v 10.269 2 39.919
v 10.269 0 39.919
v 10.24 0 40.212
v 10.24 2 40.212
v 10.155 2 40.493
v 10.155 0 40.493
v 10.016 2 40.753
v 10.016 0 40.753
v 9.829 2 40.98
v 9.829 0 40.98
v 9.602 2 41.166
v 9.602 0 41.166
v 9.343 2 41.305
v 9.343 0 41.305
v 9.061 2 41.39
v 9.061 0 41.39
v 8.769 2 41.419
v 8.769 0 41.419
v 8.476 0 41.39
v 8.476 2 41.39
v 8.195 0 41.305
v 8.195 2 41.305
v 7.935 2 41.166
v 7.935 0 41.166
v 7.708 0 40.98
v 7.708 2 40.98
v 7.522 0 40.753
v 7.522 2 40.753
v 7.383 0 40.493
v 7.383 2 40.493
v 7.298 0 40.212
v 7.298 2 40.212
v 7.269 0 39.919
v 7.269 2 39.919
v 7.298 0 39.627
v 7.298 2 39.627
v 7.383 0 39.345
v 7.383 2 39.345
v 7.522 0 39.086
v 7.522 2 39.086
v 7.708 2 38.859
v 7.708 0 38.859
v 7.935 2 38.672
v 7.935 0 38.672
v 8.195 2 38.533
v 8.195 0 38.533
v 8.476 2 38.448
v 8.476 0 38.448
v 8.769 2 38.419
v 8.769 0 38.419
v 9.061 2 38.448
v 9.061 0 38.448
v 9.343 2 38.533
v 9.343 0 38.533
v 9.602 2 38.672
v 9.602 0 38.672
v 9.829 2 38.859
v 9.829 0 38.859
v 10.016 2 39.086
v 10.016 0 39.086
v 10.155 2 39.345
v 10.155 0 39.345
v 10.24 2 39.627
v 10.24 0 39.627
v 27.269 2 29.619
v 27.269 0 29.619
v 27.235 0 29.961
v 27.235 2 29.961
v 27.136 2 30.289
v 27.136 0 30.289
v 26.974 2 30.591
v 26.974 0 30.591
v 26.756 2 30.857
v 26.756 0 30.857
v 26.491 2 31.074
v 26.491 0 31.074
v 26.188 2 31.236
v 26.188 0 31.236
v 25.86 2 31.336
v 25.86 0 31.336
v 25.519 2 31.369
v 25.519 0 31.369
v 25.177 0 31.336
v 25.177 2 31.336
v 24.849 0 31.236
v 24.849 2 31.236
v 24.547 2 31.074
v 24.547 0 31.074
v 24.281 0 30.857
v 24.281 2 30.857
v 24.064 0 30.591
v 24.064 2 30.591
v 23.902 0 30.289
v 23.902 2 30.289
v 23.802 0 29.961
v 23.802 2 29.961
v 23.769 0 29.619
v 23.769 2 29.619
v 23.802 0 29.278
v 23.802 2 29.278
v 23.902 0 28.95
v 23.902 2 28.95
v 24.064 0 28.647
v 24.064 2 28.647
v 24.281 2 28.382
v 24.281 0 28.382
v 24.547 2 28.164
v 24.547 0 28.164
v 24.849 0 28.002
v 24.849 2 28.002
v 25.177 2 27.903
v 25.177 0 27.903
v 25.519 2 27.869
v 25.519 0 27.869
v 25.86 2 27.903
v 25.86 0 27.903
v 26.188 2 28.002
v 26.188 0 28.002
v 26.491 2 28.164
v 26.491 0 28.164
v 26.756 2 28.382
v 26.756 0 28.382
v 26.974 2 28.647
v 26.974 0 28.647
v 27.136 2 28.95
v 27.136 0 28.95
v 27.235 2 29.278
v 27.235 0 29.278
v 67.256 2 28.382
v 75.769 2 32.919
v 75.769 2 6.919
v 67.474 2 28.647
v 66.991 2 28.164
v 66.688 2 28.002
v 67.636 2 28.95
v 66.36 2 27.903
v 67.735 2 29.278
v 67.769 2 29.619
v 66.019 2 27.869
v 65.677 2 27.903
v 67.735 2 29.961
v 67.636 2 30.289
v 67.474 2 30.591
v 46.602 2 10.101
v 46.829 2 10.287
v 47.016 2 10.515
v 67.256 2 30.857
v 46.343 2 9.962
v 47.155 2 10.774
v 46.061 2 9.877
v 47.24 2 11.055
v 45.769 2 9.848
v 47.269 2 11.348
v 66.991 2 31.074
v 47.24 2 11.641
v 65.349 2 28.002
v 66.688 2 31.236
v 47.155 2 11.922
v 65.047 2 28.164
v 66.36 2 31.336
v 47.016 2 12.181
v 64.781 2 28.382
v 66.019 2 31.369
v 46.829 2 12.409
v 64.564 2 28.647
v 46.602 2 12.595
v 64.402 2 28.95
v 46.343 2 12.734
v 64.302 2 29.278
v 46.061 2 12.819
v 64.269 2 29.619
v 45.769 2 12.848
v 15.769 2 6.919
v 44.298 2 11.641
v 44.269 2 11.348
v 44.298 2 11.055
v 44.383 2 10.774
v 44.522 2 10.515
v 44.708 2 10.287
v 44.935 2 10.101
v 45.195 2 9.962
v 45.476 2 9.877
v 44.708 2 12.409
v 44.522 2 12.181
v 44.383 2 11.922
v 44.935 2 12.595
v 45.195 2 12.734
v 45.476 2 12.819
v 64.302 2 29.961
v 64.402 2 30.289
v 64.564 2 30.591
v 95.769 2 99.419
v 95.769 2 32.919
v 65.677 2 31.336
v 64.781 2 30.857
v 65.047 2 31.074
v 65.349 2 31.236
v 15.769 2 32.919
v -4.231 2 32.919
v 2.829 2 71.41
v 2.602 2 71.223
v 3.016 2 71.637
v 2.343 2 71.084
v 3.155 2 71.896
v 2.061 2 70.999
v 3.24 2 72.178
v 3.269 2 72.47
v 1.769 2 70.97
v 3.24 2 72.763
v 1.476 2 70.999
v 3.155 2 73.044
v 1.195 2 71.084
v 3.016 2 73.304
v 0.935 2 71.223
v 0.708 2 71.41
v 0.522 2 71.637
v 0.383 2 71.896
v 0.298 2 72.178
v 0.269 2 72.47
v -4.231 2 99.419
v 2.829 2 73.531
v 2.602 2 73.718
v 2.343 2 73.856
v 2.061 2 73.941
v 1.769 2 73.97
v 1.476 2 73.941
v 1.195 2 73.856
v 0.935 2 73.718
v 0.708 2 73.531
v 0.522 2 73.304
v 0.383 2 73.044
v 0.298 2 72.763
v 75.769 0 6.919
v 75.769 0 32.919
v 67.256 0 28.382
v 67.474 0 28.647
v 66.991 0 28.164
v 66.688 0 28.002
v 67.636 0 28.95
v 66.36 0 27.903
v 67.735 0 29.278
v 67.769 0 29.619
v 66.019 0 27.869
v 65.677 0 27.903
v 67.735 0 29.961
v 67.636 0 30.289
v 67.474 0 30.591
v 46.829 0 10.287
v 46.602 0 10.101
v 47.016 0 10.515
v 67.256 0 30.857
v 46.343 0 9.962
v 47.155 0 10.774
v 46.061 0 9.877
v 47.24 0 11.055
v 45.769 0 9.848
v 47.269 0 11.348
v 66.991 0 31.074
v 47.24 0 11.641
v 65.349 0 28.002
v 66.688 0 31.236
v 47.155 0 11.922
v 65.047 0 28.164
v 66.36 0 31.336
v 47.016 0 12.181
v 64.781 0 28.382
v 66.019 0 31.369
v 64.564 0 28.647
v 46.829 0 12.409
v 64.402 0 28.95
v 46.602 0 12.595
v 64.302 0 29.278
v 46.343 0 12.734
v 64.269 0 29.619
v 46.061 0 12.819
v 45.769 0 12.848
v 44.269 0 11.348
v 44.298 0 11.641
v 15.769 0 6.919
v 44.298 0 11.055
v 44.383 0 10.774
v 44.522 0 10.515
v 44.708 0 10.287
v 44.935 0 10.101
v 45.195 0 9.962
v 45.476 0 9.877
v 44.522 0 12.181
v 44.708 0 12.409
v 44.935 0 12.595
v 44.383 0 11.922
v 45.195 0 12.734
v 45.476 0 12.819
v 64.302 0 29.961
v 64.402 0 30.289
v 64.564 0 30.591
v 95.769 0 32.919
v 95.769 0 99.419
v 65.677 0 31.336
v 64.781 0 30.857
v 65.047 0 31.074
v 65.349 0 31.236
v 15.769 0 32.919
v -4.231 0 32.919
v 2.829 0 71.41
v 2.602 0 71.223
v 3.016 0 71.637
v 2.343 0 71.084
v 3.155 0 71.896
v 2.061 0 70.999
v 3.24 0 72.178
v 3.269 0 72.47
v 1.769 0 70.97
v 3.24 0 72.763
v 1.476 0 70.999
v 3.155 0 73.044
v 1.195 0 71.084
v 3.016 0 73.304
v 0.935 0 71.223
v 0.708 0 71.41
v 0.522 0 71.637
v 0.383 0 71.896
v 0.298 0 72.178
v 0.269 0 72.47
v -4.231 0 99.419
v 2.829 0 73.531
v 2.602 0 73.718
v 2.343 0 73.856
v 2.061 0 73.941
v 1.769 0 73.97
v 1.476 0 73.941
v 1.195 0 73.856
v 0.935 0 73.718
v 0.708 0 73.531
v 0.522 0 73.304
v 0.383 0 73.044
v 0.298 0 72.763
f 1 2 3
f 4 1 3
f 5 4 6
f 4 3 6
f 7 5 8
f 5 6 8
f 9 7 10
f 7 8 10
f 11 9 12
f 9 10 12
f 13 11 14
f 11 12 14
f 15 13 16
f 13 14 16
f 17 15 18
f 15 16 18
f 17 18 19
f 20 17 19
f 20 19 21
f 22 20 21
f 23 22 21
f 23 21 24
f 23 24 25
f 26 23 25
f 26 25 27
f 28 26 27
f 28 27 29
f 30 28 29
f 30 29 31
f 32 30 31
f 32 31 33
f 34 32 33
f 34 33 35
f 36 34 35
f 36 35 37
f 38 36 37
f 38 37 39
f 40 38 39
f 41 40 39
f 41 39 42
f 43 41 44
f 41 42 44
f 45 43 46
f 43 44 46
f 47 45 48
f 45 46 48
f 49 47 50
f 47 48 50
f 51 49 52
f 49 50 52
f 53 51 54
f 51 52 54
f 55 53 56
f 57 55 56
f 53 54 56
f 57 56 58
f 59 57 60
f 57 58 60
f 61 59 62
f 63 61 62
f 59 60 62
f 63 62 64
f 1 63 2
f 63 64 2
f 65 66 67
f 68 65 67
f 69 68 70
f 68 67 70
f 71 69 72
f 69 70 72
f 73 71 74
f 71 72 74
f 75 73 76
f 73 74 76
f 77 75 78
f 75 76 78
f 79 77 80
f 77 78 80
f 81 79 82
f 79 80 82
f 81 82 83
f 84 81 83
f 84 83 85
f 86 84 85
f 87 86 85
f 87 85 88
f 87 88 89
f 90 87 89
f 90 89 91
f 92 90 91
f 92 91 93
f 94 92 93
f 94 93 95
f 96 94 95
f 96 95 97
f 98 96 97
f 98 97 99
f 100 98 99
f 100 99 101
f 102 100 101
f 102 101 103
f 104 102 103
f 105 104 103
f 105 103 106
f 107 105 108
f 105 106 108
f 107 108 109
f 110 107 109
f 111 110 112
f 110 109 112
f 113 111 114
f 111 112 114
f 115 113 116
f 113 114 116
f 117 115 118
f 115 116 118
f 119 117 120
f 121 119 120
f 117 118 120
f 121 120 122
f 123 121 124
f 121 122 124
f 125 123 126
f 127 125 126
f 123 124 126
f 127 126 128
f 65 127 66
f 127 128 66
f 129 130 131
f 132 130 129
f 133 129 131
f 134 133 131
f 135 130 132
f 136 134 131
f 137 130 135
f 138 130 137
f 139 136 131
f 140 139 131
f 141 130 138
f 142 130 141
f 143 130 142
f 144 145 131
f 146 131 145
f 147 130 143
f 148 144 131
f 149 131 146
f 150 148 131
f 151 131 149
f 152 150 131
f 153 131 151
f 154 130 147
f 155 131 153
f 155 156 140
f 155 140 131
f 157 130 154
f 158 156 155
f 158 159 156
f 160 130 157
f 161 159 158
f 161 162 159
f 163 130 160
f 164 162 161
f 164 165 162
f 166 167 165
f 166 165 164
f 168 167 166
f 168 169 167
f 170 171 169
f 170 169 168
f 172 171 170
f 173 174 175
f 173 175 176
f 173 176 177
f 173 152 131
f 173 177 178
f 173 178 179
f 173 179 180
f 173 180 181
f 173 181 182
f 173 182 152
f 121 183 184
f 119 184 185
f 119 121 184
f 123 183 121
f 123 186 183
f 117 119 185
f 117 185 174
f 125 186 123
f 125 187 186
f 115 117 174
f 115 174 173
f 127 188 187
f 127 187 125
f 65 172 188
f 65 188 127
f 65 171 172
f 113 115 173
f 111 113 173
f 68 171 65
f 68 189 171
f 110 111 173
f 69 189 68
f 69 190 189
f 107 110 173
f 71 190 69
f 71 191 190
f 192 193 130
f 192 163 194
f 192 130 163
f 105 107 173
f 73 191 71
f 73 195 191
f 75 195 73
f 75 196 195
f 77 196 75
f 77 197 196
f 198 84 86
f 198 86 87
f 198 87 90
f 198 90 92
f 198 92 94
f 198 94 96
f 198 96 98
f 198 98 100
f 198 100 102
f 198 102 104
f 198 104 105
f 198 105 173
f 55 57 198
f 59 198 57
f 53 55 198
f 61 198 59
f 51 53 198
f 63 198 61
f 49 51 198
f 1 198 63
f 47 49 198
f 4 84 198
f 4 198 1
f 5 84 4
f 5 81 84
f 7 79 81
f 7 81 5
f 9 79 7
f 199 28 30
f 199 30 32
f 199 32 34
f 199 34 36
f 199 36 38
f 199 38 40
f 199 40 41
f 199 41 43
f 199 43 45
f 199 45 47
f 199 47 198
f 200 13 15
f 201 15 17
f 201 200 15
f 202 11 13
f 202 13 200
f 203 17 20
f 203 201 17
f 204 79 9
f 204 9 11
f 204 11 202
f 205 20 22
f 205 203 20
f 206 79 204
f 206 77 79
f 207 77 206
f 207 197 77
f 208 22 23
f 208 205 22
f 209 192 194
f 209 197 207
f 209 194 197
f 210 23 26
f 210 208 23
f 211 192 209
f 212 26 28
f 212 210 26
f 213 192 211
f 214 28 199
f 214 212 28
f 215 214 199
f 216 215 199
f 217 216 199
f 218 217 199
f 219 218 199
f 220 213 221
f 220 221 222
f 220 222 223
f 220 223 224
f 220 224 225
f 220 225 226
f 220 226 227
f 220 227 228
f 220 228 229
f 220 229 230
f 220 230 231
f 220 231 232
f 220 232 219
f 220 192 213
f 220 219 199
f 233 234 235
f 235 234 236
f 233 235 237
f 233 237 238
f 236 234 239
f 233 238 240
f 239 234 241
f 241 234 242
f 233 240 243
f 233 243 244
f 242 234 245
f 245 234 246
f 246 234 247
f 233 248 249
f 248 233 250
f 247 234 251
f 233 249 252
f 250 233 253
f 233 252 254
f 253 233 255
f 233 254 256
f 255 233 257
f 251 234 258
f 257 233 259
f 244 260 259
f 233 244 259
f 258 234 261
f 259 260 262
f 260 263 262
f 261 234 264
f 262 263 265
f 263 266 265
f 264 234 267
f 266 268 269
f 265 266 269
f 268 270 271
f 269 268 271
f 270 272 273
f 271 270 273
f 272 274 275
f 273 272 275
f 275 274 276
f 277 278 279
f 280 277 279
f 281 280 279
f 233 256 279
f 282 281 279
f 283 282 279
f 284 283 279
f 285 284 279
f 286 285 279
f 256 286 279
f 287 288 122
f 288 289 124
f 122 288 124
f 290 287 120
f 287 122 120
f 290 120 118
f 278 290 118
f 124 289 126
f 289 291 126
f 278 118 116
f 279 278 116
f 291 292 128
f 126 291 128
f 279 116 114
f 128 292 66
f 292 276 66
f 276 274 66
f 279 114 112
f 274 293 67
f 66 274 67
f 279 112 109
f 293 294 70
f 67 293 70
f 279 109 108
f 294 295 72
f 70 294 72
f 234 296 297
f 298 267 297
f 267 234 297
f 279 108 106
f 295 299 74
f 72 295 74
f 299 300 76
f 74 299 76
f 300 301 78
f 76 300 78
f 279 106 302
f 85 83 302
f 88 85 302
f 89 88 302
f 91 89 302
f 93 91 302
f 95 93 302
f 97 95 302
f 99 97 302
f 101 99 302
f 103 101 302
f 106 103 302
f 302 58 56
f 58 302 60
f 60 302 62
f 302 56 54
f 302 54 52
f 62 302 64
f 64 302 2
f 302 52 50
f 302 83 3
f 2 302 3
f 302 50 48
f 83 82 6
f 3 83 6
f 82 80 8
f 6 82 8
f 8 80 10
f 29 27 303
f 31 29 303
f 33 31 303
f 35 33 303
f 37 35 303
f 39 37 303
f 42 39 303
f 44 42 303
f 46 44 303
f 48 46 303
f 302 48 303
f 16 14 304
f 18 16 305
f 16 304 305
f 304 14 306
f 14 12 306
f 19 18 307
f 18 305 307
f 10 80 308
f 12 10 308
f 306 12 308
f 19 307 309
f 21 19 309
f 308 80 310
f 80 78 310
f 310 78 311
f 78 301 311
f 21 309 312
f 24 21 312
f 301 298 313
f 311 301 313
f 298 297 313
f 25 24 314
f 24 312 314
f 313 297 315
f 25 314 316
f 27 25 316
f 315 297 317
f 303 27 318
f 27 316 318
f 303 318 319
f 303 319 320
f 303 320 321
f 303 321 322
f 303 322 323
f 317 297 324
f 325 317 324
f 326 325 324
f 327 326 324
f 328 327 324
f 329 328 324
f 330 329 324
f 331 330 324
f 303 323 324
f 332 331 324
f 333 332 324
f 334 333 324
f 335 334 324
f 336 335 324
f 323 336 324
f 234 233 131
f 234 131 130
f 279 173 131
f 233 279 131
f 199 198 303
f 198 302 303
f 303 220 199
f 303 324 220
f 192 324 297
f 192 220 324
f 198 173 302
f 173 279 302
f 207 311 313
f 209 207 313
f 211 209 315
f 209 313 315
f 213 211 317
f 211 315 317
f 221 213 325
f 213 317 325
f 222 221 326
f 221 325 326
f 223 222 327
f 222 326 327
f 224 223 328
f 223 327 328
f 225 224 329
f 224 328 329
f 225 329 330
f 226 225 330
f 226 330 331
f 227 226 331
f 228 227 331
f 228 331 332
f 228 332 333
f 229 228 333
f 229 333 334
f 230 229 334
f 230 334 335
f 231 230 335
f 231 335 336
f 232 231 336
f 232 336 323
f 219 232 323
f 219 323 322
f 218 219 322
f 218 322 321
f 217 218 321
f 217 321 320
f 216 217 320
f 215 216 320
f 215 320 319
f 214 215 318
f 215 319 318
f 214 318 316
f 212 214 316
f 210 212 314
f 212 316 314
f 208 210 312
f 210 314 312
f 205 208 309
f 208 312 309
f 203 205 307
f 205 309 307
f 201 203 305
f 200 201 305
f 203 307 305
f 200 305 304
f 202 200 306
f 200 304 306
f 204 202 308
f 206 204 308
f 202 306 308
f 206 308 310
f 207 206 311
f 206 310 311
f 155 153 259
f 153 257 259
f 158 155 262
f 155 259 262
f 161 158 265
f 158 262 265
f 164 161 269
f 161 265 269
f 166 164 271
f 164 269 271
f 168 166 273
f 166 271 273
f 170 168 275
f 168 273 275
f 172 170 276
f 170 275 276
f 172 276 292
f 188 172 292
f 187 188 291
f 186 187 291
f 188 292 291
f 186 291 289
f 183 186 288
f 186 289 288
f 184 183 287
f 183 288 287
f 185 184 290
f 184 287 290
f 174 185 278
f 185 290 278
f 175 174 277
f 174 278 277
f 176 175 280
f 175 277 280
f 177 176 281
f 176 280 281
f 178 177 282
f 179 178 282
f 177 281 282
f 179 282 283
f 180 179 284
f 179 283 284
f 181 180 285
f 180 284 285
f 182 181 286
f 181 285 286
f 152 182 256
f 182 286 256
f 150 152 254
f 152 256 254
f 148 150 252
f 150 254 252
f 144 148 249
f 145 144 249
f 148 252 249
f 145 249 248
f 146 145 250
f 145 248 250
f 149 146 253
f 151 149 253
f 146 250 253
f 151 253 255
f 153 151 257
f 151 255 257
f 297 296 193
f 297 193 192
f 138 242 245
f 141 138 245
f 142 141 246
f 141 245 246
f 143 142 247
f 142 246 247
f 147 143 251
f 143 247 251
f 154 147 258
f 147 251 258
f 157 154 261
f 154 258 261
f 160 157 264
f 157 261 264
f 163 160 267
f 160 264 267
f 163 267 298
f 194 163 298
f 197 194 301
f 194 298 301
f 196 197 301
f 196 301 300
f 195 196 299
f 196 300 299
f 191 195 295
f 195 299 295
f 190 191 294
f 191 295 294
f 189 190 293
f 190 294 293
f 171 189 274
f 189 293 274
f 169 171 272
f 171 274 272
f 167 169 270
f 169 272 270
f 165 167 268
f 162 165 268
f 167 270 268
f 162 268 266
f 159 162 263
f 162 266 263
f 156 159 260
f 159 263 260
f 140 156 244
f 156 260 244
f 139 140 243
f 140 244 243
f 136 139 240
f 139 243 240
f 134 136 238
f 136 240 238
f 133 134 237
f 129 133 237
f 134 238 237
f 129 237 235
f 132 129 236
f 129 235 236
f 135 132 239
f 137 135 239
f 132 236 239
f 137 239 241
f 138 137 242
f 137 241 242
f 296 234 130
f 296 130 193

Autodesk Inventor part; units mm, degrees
ref_plane "YZ Plane" through (0, 0, 0) normal (1, 0, 0) x (0, 1, 0)
ref_plane "XZ Plane" through (0, 0, 0) normal (0, 1, 0) x (-1, 0, 0)
ref_plane "XY Plane" through (0, 0, 0) normal (0, 0, 1) x (1, 0, 0)
sketch "Sketch1" plane through (0, 0, 0) normal (0, 1, 0) x (-1, 0, 0)
  line L0 (-95.7688, 101.9192) -> (4.2312, 101.9192)
  line L1 (4.2312, 101.9192) -> (4.2312, 1.9192)
  line L2 (4.2312, 1.9192) -> (-95.7688, 1.9192)
  line L3 (-95.7688, 1.9192) -> (-95.7688, 101.9192)
  line L4 (-95.7688, 1.9192) -> (4.2312, 1.9192)
  line L5 (4.2312, 1.9192) -> (4.2312, 6.9192)
  line L6 (4.2312, 6.9192) -> (-95.7688, 6.9192)
  line L7 (-95.7688, 6.9192) -> (-95.7688, 1.9192)
  line L8 (4.2312, 1.9192) -> (-15.7688, 1.9192)
  line L9 (-15.7688, 1.9192) -> (-15.7688, 32.9192)
  line L10 (-15.7688, 32.9192) -> (4.2312, 32.9192)
  line L11 (4.2312, 32.9192) -> (4.2312, 1.9192)
  line L12 (-95.7688, 1.9192) -> (-75.7688, 1.9192)
  line L13 (-75.7688, 1.9192) -> (-75.7688, 32.9192)
  line L14 (-75.7688, 32.9192) -> (-95.7688, 32.9192)
  line L15 (-95.7688, 32.9192) -> (-95.7688, 1.9192)
  point P0 (0, 0)
  dimension "d0" = 100
  dimension "d1" = 100
  dimension "d2" = 5
  dimension "d3" = 20
  dimension "d4" = 31
  dimension "d5" = 20
extrude "Extrusion1" add sketch "Sketch1" along normal blind 2 contours L0 L1 L10 L9 L6 L13 L14 L3 | L6 L9 L2 L13
sketch "Sketch2" plane through (0, 2, 0) normal (0, 1, 0) x (1, 0, 0)
  line L0 (-4.2312, -82.6348) -> (-4.2312, -11.6268) projected
  line L1 (95.7688, -11.6268) -> (95.7688, -82.6348) projected
  line L2 (75.7688, -32.9192) -> (75.7688, -1.9192) projected
  line L3 (15.7688, -1.9192) -> (15.7688, -32.9192) projected
  line L4 (75.7688, -1.9192) -> (15.7688, -1.9192)
  line L5 (15.7688, -1.9192) -> (15.7688, -6.9192)
  line L6 (15.7688, -6.9192) -> (75.7688, -6.9192)
  line L7 (75.7688, -6.9192) -> (75.7688, -1.9192)
  line L8 (95.7688, -82.6348) -> (-4.2312, -82.6348) projected
  line L9 (95.7688, -11.6268) -> (-4.2312, -11.6268) projected
  point P0 (0, 0)
  dimension "d8" = 5
extrude "Extrusion2" cut sketch "Sketch2" against normal blind 2 contours L3 L4 L2 L6
sketch "Szkic3" plane through (0, 2, 0) normal (0, 1, 0) x (1, 0, 0)
  circle A0 centre (66.0188, -29.6192) radius 1.75
  circle A1 centre (25.5188, -29.6192) radius 1.75
  point P0 (0, 0)
extrude "Wyciągnięcie proste3" cut sketch "Szkic3" against normal through all
sketch "Szkic4" plane through (0, 0, 0) normal (0, -1, 0) x (1, 0, 0)
  circle A0 centre (25.5188, 29.6192) radius 1.75 projected
  circle A1 centre (66.0188, 29.6192) radius 1.75 projected
  line L0 (15.7688, 6.9192) -> (75.7688, 6.9192) projected
  line L1 (75.7688, 32.9192) -> (75.7688, 6.9192) projected
  line L2 (95.7688, 32.9192) -> (75.7688, 32.9192) projected
  line L3 (95.7688, 101.9192) -> (95.7688, 32.9192) projected
  line L4 (-4.2312, 101.9192) -> (95.7688, 101.9192) projected
  line L5 (-4.2312, 32.9192) -> (-4.2312, 101.9192) projected
  line L6 (15.7688, 32.9192) -> (-4.2312, 32.9192) projected
  line L7 (15.7688, 6.9192) -> (15.7688, 32.9192) projected
  point P0 (0, 0)
extrude "Wyciągnięcie proste4" add sketch "Szkic4" against normal up to surface (2 mm away) contours A0 | A1
sketch "Szkic5" plane through (0, 2, 0) normal (0, 1, 0) x (1, 0, 0)
  circle A0 centre (22.8938, -32.6829) radius 1.5
  circle A1 centre (68.6438, -32.6829) radius 1.5
  point P0 (0, 0)
extrude "Wyciągnięcie proste5" cut sketch "Szkic5" against normal through all
sketch "Szkic6" plane through (-4.2312, 0, 101.9192) normal (0, 0, 1) x (1, 0, 0)
  line L0 (0, 0) -> (100, 0) projected
  line L1 (100, 0) -> (100, 2) projected
  line L2 (0, 2) -> (100, 2) projected
  line L3 (0, 0) -> (0, 2) projected
  point P0 (4.2312, 0)
extrude "Wyciągnięcie proste6" cut sketch "Szkic6" against normal blind 2.5
sketch "Szkic7" plane through (0, 0, 0) normal (0, -1, 0) x (1, 0, 0)
  circle A0 centre (1.7688, 72.4703) radius 1.5
  circle A1 centre (8.7688, 39.9192) radius 1.5
  point P0 (0, 0)
extrude "Wyciągnięcie proste7" cut sketch "Szkic7" against normal through all
sketch "Szkic8" plane through (0, 0, 0) normal (0, -1, 0) x (1, 0, 0)
  circle A0 centre (8.7688, 39.9192) radius 1.5 projected
  circle A1 centre (1.7688, 72.4703) radius 1.5 projected
  line L0 (95.7688, 99.4192) -> (-4.2312, 99.4192) projected
  line L1 (-4.2312, 32.9192) -> (-4.2312, 99.4192) projected
  line L2 (15.7688, 32.9192) -> (-4.2312, 32.9192) projected
  line L3 (15.7688, 6.9192) -> (15.7688, 32.9192) projected
  line L4 (15.7688, 6.9192) -> (75.7688, 6.9192) projected
  line L5 (75.7688, 32.9192) -> (75.7688, 6.9192) projected
  line L6 (95.7688, 32.9192) -> (75.7688, 32.9192) projected
  line L7 (95.7688, 99.4192) -> (95.7688, 32.9192) projected
  circle A2 centre (22.8938, 32.6829) radius 1.5 projected
  circle A3 centre (68.6438, 32.6829) radius 1.5 projected
  line L8 (-4.2312, 39.9192) -> (21.3688, 39.9192)
  circle A4 centre (21.3688, 39.9192) radius 2.1391
  line L9 (-4.2312, 32.9192) -> (-4.2312, 60.9192)
  line L10 (-4.2312, 32.9192) -> (-4.2312, 99.4192) projected
  point P0 (0, 0)
  dimension "d21" = 25.6
  dimension "d22" = 28
sketch "Szkic9" plane through (0, 0, 0) normal (0, -1, 0) x (1, 0, 0)
  circle A0 centre (25.5188, 29.6192) radius 1.75
  circle A1 centre (66.0188, 29.6192) radius 1.75
  point P0 (0, 0)
extrude "Wyciągnięcie proste8" cut sketch "Szkic9" against normal through all
extrude "Wyciągnięcie proste9" add sketch "Szkic8" against normal up to surface (2 mm away) contours A2 | A3
sketch "Szkic10" plane through (0, 0, 0) normal (0, -1, 0) x (1, 0, 0)
  circle A0 centre (45.7688, 11.3479) radius 1.5
  point P0 (0, 0)
extrude "Wyciągnięcie proste10" cut sketch "Szkic10" against normal through all
properties part number "minisumopodsr" material "Aluminum 6061"
